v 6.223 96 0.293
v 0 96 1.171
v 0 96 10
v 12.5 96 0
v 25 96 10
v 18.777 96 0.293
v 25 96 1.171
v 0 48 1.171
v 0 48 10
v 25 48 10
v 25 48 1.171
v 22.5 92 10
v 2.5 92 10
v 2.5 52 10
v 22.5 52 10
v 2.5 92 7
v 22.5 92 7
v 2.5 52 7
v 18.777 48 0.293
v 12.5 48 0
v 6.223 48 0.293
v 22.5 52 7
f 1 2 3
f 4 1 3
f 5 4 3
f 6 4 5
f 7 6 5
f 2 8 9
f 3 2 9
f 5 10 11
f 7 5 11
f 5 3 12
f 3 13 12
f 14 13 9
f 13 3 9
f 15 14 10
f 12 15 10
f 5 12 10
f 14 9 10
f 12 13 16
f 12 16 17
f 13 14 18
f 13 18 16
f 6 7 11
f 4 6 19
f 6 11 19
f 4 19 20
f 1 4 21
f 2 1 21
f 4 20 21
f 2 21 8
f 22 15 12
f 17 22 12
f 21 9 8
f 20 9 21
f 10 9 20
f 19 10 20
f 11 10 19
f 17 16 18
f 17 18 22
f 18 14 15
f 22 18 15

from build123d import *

# Parameters (mm, degrees)
SKETCH1_W           = 25
SKETCH1_H           = 48
BOSS_EXTRUDE1_DEPTH = 10
BOSS_EXTRUDE2_DEPTH = 48
SKETCH4_W           = 17.037497091
SKETCH4_H           = 48
CUT_EXTRUDE1_DEPTH  = 48
SKETCH5_W           = 20
SKETCH5_H           = 40
CUT_EXTRUDE2_DEPTH  = 3


with BuildPart() as part:
    # Sketch1 → Boss-Extrude1 (new body)
    with BuildSketch(Plane.XY):
        with Locations((12.5, 24)):
            Rectangle(SKETCH1_W, SKETCH1_H)
    extrude(amount=BOSS_EXTRUDE1_DEPTH)

    # Sketch3 → Boss-Extrude2 (add)
    with BuildSketch(Plane(origin=(0, 48, 0), x_dir=(1, 0, 0), z_dir=(0, 1, 0))):
        with BuildLine():
            Line((0, -1.170858034), (0, -10))
            Line((0, -10), (25, -10))
            Line((25, -10), (25, -1.170858034))
            ThreePointArc((25, -1.170858034), (12.5, 0), (0, -1.170858034))
        make_face()
    extrude(amount=BOSS_EXTRUDE2_DEPTH)

    # Sketch4 → Cut-Extrude1 (cut)
    with BuildSketch(Plane(origin=(25, 0, 0), x_dir=(0, 0, -1), z_dir=(1, 0, 0))):
        with Locations((-8.518748546, 24)):
            Rectangle(SKETCH4_W, SKETCH4_H)
    extrude(amount=-CUT_EXTRUDE1_DEPTH, mode=Mode.SUBTRACT)

    # Sketch5 → Cut-Extrude2 (cut)
    with BuildSketch(Plane.XY.offset(10)):
        with Locations((12.5, 72)):
            Rectangle(SKETCH5_W, SKETCH5_H)
    extrude(amount=-CUT_EXTRUDE2_DEPTH, mode=Mode.SUBTRACT)


solid = part.part
